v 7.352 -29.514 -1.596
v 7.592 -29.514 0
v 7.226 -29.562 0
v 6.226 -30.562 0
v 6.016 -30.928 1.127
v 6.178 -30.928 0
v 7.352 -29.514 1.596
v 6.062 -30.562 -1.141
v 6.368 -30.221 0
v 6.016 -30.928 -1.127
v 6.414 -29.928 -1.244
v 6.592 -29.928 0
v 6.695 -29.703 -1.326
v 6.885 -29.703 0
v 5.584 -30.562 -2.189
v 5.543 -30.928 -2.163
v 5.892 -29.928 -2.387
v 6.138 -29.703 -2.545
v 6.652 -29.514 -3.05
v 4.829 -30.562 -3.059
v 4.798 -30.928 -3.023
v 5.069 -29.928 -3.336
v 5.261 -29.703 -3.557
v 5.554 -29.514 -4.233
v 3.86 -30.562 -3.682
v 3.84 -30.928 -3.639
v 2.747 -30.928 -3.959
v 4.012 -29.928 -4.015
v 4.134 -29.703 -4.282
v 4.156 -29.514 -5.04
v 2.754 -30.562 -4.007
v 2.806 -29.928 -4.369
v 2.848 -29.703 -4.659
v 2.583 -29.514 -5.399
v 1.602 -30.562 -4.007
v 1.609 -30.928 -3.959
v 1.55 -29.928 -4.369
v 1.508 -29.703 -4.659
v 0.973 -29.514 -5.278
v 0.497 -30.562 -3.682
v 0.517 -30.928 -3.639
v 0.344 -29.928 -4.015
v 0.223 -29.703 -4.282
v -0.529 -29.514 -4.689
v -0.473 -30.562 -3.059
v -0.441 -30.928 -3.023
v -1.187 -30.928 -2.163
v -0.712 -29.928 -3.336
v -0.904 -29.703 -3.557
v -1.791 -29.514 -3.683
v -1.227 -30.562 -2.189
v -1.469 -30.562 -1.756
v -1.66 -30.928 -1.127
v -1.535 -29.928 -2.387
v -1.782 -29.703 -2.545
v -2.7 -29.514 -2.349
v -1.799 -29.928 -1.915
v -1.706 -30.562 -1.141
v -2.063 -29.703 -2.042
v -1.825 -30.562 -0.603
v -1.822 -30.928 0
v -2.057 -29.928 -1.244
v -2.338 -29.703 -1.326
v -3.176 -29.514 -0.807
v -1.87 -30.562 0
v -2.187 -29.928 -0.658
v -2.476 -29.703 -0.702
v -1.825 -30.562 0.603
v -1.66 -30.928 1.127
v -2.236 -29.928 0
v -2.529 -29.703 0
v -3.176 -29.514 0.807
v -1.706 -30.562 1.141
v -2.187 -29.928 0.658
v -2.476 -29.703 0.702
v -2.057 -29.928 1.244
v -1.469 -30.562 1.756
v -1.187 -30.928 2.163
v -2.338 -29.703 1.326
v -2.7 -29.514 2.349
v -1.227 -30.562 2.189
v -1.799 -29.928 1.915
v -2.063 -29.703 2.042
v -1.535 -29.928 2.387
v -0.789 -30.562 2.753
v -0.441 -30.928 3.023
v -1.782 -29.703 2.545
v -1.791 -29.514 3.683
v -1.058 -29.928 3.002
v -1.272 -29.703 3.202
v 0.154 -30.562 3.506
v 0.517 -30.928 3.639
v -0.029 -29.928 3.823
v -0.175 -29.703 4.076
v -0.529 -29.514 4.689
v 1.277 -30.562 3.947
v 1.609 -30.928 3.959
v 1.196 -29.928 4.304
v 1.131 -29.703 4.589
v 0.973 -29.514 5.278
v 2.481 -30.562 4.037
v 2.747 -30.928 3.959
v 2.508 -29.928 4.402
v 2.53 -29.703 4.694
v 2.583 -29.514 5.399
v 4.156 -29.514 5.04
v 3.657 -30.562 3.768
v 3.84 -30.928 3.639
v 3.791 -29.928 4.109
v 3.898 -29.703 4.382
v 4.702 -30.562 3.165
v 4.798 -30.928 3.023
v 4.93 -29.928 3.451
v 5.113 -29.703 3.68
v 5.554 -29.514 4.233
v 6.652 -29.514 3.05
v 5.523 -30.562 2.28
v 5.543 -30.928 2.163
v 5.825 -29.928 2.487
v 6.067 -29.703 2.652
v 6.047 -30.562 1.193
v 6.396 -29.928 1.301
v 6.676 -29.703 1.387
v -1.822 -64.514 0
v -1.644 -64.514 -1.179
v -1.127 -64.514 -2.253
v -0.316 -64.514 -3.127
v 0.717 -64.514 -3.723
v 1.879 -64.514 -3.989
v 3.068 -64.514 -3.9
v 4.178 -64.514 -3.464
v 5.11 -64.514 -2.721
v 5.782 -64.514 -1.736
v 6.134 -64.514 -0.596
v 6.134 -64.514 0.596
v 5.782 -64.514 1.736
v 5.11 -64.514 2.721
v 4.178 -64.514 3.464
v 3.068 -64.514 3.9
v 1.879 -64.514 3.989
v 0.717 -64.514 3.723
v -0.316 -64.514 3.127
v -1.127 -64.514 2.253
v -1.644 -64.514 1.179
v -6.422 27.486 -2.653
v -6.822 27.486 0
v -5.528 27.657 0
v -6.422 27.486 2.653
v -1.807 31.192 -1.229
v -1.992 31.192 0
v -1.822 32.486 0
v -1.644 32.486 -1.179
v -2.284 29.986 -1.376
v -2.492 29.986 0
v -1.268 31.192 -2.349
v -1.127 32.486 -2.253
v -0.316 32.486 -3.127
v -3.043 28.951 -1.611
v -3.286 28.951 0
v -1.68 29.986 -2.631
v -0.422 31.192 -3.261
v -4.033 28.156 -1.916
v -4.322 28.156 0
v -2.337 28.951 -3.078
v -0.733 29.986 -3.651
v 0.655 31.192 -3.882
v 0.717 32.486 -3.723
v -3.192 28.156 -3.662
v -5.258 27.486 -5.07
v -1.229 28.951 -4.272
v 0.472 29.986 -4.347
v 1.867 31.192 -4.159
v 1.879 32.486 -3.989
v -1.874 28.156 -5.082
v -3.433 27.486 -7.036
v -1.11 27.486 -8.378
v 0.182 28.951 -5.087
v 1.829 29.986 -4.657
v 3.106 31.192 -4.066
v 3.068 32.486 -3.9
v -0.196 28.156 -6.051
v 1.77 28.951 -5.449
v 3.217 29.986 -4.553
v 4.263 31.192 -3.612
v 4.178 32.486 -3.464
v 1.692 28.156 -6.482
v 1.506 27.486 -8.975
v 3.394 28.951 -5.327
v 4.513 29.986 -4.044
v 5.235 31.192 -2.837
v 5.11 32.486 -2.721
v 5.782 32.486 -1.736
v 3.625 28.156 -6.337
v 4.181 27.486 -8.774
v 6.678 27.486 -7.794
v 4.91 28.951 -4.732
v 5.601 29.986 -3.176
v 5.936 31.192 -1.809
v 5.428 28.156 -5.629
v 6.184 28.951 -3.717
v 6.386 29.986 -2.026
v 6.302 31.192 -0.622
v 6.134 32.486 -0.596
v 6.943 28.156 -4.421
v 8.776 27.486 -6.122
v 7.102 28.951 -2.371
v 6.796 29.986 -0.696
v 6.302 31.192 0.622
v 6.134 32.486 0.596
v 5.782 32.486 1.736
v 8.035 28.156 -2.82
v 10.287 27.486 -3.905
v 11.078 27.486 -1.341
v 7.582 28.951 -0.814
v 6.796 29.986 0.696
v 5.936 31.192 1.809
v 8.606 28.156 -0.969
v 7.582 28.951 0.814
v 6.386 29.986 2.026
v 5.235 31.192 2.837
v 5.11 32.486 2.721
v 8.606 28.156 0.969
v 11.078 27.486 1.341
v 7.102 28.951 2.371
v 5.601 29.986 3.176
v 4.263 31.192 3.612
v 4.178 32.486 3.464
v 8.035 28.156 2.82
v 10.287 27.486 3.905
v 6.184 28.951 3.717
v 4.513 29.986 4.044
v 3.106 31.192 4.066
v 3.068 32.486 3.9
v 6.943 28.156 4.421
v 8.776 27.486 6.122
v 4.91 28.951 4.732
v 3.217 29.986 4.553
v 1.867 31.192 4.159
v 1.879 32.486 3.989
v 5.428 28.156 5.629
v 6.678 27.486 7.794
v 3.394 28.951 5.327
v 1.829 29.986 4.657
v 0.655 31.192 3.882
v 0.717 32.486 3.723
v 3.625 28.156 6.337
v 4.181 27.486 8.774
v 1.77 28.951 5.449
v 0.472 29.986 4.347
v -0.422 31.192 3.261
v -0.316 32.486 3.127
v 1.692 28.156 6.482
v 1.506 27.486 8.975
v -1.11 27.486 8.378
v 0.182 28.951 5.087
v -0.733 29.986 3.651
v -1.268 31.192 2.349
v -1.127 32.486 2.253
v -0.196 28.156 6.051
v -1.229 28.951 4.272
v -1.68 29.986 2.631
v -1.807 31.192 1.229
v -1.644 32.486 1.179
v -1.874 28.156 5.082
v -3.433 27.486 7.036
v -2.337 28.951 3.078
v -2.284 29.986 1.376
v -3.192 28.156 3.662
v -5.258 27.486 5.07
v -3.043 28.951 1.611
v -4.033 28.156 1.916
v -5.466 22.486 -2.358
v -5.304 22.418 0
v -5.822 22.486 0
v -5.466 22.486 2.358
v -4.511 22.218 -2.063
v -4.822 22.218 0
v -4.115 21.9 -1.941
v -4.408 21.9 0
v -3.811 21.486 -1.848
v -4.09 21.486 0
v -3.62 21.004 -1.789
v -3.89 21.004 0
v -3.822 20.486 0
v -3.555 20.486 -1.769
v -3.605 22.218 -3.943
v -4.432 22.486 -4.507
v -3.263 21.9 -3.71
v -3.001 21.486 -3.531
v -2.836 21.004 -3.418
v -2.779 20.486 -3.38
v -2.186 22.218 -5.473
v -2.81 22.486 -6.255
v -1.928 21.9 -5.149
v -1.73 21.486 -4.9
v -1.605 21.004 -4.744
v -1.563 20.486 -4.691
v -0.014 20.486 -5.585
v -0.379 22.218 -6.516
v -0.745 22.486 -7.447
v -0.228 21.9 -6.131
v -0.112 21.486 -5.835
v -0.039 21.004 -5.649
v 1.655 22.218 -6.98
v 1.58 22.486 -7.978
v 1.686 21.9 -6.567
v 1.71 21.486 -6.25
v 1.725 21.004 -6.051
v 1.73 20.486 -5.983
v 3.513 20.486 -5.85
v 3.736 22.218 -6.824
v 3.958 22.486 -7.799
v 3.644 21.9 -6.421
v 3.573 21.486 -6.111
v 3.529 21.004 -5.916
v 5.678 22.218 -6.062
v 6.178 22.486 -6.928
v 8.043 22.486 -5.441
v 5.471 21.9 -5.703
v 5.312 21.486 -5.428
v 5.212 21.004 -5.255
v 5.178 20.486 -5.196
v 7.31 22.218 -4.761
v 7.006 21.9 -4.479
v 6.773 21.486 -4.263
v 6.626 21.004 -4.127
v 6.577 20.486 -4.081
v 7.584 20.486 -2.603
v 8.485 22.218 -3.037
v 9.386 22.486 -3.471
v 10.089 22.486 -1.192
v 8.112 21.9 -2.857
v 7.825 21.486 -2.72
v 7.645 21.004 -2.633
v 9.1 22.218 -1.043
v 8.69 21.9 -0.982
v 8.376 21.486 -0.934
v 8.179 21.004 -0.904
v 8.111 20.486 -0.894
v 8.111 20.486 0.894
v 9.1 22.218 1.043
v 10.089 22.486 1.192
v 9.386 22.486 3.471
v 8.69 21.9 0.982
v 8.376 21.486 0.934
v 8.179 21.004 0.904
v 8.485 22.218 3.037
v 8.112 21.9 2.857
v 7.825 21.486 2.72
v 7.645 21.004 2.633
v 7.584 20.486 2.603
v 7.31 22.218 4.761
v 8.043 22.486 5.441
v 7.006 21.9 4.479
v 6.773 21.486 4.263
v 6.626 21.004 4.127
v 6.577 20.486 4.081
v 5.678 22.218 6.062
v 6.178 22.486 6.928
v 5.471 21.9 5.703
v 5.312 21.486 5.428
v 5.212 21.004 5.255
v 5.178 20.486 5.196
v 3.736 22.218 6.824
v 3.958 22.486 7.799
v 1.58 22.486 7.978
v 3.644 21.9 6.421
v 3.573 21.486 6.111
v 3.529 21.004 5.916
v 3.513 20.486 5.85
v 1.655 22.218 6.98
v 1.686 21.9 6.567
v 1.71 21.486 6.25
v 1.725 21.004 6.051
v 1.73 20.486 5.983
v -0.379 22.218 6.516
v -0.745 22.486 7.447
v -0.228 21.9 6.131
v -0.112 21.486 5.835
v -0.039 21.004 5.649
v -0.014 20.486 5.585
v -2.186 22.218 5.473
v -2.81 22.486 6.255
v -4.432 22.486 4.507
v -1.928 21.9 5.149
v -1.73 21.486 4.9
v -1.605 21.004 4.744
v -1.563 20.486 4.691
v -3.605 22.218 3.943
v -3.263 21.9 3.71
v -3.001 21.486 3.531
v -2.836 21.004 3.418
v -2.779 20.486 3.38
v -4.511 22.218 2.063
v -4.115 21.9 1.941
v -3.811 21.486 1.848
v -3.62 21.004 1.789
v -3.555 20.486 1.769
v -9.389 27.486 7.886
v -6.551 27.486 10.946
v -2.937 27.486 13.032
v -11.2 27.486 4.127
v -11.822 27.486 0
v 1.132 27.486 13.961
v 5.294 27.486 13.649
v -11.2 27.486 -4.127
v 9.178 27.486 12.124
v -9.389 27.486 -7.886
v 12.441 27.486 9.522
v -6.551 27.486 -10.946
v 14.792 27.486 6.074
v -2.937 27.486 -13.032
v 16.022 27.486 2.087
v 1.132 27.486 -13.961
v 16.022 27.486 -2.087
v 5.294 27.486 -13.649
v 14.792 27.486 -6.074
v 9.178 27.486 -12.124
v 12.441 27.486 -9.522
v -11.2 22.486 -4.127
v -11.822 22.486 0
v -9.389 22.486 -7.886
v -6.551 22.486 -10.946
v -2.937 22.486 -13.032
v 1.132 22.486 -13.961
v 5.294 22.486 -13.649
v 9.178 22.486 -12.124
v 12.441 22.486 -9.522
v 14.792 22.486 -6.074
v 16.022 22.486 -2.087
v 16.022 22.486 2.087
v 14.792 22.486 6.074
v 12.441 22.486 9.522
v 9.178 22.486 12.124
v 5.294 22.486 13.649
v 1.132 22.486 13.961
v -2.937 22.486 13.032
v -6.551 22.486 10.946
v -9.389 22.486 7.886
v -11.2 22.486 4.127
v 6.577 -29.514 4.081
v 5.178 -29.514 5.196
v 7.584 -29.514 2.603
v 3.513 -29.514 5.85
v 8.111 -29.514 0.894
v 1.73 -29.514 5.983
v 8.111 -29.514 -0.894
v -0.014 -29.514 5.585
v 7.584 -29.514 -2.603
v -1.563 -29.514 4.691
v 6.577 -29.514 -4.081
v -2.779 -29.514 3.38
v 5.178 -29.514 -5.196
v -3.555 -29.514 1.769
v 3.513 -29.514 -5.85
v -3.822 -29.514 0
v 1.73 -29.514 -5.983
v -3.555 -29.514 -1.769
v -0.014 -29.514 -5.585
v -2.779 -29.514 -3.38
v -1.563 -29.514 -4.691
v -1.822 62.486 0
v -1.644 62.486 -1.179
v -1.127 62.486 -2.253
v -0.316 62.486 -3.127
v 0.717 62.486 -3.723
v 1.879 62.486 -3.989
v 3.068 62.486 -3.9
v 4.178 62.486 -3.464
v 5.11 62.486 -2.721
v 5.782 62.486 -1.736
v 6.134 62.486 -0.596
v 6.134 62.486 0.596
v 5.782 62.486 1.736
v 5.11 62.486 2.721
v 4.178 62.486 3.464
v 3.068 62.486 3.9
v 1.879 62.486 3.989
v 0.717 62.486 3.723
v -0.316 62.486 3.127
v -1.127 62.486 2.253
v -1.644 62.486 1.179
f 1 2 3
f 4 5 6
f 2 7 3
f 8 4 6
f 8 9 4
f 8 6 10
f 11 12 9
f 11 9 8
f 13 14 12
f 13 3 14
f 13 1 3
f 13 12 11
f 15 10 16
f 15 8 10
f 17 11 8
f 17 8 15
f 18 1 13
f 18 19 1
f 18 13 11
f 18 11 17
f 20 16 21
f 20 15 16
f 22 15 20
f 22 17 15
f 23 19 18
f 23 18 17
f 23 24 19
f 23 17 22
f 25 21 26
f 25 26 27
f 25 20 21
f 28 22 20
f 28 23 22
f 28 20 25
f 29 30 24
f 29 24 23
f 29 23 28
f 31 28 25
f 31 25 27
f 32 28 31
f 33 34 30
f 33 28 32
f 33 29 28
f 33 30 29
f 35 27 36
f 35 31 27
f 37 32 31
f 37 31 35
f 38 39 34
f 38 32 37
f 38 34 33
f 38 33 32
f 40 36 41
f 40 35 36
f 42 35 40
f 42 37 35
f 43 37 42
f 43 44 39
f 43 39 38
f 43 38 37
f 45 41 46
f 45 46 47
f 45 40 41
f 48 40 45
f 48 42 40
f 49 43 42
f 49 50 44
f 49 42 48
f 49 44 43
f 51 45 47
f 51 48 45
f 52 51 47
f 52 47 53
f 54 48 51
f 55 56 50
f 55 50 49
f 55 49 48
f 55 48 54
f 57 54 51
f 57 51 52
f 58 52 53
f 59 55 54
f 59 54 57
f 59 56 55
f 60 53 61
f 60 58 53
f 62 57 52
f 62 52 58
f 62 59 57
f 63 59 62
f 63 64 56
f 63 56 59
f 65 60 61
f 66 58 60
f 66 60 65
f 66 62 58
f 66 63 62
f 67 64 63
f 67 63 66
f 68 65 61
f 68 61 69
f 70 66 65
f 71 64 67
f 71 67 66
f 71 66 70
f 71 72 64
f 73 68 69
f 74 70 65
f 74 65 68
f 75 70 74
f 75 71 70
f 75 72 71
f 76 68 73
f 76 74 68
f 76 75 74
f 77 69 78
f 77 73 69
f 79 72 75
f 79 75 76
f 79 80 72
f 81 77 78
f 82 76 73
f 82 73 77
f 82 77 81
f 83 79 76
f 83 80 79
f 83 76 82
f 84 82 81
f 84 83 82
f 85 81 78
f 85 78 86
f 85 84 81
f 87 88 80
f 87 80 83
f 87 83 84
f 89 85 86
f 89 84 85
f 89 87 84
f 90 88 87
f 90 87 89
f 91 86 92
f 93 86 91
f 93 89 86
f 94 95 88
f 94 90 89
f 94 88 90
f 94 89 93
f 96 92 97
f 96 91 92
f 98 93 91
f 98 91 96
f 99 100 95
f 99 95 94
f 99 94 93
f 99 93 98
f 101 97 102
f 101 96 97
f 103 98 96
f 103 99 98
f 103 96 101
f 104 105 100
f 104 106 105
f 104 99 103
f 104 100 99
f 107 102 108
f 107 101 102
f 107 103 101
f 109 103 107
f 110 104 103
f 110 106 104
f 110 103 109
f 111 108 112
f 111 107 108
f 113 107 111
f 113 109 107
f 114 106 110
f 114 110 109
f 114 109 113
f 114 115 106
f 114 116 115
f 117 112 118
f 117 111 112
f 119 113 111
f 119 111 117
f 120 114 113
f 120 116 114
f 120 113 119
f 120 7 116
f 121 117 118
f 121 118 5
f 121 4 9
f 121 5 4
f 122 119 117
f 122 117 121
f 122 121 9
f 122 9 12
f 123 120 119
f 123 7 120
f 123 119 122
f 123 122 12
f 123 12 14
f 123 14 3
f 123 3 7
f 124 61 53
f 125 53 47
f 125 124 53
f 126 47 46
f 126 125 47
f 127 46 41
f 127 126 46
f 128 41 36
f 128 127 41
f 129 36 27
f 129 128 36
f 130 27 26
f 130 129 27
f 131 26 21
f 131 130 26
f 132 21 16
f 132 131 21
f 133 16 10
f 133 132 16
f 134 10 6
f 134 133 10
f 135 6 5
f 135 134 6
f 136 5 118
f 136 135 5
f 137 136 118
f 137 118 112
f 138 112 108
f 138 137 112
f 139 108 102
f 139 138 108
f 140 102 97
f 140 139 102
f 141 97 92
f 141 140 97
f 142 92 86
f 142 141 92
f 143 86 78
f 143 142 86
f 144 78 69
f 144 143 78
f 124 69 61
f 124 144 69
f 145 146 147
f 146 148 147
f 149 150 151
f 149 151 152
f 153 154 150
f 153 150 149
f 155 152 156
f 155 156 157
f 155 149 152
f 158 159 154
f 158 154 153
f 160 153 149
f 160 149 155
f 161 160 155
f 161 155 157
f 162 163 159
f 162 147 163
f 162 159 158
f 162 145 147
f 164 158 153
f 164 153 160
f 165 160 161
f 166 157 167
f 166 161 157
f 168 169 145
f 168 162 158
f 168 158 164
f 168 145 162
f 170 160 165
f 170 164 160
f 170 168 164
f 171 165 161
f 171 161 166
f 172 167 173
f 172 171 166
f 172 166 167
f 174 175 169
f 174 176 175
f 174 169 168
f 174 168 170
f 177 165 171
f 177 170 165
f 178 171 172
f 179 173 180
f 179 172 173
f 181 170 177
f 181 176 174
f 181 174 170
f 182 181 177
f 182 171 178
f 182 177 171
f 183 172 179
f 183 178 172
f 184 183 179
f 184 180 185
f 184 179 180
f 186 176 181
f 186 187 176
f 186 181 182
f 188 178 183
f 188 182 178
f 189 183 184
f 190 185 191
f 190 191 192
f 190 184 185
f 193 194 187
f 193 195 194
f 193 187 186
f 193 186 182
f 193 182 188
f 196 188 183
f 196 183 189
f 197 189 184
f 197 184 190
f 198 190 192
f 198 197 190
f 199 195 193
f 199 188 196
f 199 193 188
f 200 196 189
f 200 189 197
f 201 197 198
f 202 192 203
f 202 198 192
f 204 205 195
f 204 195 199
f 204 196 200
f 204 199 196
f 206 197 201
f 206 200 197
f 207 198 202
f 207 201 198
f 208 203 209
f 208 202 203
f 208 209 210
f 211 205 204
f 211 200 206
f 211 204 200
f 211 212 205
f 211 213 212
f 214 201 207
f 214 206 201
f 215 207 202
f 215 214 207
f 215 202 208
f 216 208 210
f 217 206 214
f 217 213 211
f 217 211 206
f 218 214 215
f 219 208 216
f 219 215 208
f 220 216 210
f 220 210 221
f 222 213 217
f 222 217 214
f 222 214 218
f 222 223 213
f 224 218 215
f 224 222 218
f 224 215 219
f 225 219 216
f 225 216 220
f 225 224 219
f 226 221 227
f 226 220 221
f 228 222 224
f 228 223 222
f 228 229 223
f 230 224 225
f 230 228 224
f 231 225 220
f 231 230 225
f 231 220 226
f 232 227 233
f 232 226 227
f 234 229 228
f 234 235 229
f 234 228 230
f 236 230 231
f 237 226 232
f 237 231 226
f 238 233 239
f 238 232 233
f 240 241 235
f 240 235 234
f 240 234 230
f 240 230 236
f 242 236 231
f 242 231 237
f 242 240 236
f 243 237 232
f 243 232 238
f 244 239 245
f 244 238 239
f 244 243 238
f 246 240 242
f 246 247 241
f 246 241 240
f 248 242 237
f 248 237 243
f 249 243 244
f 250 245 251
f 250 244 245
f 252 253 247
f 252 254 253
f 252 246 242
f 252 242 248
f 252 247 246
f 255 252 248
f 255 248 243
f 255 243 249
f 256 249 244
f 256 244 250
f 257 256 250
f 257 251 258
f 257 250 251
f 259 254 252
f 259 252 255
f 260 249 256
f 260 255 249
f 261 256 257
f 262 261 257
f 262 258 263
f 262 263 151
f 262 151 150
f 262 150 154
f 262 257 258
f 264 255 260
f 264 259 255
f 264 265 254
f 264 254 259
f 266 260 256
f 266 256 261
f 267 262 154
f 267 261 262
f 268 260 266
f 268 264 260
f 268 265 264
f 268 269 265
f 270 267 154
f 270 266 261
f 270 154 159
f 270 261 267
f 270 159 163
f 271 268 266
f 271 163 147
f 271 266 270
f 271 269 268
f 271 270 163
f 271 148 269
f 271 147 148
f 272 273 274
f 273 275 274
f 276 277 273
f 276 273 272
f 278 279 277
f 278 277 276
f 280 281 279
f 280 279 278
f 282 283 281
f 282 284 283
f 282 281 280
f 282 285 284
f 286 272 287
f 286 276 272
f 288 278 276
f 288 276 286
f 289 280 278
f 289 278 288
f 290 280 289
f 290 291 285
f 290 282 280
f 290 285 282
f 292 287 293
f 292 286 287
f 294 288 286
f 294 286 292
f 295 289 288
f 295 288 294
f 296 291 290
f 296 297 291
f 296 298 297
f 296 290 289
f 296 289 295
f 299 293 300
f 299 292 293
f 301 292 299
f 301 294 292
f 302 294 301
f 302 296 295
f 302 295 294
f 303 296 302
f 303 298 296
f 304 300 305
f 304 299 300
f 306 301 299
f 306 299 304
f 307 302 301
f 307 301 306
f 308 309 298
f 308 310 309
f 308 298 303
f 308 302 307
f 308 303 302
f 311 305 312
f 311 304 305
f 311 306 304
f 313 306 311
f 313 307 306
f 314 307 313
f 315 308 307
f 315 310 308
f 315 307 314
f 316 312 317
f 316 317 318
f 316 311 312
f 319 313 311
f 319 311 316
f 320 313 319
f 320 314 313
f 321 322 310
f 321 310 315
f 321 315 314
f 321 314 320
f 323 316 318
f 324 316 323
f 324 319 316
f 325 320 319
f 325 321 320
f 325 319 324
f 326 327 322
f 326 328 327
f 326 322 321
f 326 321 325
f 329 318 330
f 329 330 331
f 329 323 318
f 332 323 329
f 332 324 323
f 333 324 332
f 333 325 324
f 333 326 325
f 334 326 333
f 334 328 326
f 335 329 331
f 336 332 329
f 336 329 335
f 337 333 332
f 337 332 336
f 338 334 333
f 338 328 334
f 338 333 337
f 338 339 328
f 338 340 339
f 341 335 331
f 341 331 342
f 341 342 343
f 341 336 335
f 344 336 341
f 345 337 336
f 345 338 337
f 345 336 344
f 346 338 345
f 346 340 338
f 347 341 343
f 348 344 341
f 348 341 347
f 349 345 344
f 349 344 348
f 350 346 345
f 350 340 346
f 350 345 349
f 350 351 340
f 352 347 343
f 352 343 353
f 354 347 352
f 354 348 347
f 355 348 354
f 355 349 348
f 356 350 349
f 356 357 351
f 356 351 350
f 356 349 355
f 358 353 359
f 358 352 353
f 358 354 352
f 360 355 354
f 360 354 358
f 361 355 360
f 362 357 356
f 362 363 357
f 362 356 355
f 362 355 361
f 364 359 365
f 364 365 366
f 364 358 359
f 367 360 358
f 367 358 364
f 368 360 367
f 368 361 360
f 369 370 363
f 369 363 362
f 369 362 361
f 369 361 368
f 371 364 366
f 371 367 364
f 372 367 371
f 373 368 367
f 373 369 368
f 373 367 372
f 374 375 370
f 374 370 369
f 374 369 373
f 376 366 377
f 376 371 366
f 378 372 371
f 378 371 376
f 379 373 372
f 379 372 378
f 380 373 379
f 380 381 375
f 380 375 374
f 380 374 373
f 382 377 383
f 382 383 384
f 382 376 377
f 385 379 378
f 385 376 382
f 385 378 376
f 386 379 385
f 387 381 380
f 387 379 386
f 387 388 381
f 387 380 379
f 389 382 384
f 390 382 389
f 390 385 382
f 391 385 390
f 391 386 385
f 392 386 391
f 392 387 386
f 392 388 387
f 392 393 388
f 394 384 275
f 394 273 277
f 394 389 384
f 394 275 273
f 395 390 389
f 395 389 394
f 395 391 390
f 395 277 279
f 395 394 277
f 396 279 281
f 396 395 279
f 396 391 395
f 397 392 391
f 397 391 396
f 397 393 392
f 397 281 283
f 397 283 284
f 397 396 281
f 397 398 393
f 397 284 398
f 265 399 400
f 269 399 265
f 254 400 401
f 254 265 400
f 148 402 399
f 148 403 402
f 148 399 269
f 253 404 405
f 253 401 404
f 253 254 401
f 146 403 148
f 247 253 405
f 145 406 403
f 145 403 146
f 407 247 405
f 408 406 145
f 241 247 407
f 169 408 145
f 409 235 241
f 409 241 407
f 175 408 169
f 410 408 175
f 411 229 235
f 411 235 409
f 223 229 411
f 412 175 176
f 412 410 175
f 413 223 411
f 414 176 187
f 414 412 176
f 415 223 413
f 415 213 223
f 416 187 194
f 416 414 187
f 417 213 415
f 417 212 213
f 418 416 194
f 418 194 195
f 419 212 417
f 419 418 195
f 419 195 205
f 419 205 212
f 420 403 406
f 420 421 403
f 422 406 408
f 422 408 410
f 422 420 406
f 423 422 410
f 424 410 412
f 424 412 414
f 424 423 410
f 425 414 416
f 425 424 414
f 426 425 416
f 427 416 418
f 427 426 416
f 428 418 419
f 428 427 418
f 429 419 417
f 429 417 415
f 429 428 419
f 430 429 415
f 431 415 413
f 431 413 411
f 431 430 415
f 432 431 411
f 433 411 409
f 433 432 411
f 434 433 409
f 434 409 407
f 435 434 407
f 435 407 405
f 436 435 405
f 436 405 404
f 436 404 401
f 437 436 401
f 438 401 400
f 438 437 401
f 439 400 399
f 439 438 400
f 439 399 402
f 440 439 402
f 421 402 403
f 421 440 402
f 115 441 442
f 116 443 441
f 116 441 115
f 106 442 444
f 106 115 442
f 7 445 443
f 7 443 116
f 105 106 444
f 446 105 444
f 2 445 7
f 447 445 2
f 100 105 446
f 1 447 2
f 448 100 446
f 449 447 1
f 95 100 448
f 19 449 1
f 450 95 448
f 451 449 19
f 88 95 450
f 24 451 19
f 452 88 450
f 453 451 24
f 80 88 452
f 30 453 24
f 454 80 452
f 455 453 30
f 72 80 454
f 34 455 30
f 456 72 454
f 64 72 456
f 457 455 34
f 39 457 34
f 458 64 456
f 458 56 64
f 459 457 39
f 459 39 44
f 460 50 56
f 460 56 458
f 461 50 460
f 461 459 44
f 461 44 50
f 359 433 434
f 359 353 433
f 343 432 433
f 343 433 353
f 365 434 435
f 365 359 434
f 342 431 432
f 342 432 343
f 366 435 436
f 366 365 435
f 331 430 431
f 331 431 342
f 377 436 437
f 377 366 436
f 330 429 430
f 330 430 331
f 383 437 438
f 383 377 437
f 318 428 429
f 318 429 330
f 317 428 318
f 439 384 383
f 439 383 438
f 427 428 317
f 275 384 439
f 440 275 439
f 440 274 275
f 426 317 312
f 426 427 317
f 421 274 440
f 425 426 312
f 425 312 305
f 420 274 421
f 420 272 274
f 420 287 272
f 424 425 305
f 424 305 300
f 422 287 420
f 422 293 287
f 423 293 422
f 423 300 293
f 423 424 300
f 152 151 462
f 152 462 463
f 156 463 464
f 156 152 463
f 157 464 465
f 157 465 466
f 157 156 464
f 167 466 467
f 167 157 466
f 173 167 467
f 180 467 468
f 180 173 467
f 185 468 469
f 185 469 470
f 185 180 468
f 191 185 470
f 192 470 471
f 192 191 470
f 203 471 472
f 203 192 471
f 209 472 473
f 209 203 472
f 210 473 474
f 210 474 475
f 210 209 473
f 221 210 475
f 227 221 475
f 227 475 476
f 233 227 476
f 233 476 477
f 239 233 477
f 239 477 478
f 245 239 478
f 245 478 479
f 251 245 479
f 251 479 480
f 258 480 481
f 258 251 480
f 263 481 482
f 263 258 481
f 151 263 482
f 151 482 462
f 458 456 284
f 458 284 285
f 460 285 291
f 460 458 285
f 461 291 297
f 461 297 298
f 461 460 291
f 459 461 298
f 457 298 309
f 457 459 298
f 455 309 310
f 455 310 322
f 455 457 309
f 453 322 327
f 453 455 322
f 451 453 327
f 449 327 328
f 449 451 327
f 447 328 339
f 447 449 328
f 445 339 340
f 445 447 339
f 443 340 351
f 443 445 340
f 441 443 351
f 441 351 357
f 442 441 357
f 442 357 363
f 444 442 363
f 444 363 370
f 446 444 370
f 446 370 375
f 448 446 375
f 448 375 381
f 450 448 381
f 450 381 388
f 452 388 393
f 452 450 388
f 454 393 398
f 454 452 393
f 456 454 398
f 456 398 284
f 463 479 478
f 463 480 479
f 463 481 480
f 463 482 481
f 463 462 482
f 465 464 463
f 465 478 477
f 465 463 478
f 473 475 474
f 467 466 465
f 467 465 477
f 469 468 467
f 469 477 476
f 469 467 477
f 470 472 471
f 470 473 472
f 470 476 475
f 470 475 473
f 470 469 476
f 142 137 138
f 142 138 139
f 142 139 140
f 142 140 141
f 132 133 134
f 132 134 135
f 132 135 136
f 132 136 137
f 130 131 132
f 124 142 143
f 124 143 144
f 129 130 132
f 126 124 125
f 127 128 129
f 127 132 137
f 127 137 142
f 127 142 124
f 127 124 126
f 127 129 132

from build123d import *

# Parameters (mm, degrees)
FILLET1_R = 5
FILLET2_R = 2


with BuildPart() as part:
    # Sketch1 → Revolve1 (revolve)
    with BuildSketch(Plane.XY, mode=Mode.PRIVATE) as revolve1_sk:
        Polygon((6.178218081, 62.486265198), (6.178218081, 27.486265198), (16.178218081, 27.486265198), (16.178218081, 22.486265198), (8.178218081, 22.486265198), (8.178218081, -29.513734802), (6.178218081, -29.513734802), (6.178218081, -64.513734802), (2.178218081, -64.513734802), (2.178218081, 62.486265198), align=None)
    revolve(revolve1_sk.sketch.rotate(Axis((2.178218081, 62.486265198, 0), (0, -1, 0)), 180), axis=Axis((2.178218081, 62.486265198, 0), (0, -1, 0)))

    # Fillet1
    fillet1_edges = [part.edges().sort_by_distance(p)[0] for p in [
        (6.178218081, 27.486265198, 0),
    ]]
    fillet(fillet1_edges, radius=FILLET1_R)

    # Fillet2
    fillet2_edges = [part.edges().sort_by_distance(p)[0] for p in [
        (8.178218081, 22.486265198, 0),
    ]]
    fillet(fillet2_edges, radius=FILLET2_R)

    # Fillet3: read off the stored shape, not the designer's step
    # Fillet3 outline → Fillet3 (revolve)
    with BuildSketch(Plane(origin=(2.178218081, 0, 0), x_dir=(1, 0, 0), z_dir=(0, 0, 1))):
        with BuildLine():
            Line((4, -29.513734802), (4, -30.927948365))
            ThreePointArc((4, -30.927948365), (4.414213562, -29.927948365), (5.414213562, -29.513734802))
            Line((5.414213562, -29.513734802), (4, -29.513734802))
        make_face()
    revolve(axis=Axis((2.178218081, 0, 0), (0, 1, 0)))


solid = part.part
